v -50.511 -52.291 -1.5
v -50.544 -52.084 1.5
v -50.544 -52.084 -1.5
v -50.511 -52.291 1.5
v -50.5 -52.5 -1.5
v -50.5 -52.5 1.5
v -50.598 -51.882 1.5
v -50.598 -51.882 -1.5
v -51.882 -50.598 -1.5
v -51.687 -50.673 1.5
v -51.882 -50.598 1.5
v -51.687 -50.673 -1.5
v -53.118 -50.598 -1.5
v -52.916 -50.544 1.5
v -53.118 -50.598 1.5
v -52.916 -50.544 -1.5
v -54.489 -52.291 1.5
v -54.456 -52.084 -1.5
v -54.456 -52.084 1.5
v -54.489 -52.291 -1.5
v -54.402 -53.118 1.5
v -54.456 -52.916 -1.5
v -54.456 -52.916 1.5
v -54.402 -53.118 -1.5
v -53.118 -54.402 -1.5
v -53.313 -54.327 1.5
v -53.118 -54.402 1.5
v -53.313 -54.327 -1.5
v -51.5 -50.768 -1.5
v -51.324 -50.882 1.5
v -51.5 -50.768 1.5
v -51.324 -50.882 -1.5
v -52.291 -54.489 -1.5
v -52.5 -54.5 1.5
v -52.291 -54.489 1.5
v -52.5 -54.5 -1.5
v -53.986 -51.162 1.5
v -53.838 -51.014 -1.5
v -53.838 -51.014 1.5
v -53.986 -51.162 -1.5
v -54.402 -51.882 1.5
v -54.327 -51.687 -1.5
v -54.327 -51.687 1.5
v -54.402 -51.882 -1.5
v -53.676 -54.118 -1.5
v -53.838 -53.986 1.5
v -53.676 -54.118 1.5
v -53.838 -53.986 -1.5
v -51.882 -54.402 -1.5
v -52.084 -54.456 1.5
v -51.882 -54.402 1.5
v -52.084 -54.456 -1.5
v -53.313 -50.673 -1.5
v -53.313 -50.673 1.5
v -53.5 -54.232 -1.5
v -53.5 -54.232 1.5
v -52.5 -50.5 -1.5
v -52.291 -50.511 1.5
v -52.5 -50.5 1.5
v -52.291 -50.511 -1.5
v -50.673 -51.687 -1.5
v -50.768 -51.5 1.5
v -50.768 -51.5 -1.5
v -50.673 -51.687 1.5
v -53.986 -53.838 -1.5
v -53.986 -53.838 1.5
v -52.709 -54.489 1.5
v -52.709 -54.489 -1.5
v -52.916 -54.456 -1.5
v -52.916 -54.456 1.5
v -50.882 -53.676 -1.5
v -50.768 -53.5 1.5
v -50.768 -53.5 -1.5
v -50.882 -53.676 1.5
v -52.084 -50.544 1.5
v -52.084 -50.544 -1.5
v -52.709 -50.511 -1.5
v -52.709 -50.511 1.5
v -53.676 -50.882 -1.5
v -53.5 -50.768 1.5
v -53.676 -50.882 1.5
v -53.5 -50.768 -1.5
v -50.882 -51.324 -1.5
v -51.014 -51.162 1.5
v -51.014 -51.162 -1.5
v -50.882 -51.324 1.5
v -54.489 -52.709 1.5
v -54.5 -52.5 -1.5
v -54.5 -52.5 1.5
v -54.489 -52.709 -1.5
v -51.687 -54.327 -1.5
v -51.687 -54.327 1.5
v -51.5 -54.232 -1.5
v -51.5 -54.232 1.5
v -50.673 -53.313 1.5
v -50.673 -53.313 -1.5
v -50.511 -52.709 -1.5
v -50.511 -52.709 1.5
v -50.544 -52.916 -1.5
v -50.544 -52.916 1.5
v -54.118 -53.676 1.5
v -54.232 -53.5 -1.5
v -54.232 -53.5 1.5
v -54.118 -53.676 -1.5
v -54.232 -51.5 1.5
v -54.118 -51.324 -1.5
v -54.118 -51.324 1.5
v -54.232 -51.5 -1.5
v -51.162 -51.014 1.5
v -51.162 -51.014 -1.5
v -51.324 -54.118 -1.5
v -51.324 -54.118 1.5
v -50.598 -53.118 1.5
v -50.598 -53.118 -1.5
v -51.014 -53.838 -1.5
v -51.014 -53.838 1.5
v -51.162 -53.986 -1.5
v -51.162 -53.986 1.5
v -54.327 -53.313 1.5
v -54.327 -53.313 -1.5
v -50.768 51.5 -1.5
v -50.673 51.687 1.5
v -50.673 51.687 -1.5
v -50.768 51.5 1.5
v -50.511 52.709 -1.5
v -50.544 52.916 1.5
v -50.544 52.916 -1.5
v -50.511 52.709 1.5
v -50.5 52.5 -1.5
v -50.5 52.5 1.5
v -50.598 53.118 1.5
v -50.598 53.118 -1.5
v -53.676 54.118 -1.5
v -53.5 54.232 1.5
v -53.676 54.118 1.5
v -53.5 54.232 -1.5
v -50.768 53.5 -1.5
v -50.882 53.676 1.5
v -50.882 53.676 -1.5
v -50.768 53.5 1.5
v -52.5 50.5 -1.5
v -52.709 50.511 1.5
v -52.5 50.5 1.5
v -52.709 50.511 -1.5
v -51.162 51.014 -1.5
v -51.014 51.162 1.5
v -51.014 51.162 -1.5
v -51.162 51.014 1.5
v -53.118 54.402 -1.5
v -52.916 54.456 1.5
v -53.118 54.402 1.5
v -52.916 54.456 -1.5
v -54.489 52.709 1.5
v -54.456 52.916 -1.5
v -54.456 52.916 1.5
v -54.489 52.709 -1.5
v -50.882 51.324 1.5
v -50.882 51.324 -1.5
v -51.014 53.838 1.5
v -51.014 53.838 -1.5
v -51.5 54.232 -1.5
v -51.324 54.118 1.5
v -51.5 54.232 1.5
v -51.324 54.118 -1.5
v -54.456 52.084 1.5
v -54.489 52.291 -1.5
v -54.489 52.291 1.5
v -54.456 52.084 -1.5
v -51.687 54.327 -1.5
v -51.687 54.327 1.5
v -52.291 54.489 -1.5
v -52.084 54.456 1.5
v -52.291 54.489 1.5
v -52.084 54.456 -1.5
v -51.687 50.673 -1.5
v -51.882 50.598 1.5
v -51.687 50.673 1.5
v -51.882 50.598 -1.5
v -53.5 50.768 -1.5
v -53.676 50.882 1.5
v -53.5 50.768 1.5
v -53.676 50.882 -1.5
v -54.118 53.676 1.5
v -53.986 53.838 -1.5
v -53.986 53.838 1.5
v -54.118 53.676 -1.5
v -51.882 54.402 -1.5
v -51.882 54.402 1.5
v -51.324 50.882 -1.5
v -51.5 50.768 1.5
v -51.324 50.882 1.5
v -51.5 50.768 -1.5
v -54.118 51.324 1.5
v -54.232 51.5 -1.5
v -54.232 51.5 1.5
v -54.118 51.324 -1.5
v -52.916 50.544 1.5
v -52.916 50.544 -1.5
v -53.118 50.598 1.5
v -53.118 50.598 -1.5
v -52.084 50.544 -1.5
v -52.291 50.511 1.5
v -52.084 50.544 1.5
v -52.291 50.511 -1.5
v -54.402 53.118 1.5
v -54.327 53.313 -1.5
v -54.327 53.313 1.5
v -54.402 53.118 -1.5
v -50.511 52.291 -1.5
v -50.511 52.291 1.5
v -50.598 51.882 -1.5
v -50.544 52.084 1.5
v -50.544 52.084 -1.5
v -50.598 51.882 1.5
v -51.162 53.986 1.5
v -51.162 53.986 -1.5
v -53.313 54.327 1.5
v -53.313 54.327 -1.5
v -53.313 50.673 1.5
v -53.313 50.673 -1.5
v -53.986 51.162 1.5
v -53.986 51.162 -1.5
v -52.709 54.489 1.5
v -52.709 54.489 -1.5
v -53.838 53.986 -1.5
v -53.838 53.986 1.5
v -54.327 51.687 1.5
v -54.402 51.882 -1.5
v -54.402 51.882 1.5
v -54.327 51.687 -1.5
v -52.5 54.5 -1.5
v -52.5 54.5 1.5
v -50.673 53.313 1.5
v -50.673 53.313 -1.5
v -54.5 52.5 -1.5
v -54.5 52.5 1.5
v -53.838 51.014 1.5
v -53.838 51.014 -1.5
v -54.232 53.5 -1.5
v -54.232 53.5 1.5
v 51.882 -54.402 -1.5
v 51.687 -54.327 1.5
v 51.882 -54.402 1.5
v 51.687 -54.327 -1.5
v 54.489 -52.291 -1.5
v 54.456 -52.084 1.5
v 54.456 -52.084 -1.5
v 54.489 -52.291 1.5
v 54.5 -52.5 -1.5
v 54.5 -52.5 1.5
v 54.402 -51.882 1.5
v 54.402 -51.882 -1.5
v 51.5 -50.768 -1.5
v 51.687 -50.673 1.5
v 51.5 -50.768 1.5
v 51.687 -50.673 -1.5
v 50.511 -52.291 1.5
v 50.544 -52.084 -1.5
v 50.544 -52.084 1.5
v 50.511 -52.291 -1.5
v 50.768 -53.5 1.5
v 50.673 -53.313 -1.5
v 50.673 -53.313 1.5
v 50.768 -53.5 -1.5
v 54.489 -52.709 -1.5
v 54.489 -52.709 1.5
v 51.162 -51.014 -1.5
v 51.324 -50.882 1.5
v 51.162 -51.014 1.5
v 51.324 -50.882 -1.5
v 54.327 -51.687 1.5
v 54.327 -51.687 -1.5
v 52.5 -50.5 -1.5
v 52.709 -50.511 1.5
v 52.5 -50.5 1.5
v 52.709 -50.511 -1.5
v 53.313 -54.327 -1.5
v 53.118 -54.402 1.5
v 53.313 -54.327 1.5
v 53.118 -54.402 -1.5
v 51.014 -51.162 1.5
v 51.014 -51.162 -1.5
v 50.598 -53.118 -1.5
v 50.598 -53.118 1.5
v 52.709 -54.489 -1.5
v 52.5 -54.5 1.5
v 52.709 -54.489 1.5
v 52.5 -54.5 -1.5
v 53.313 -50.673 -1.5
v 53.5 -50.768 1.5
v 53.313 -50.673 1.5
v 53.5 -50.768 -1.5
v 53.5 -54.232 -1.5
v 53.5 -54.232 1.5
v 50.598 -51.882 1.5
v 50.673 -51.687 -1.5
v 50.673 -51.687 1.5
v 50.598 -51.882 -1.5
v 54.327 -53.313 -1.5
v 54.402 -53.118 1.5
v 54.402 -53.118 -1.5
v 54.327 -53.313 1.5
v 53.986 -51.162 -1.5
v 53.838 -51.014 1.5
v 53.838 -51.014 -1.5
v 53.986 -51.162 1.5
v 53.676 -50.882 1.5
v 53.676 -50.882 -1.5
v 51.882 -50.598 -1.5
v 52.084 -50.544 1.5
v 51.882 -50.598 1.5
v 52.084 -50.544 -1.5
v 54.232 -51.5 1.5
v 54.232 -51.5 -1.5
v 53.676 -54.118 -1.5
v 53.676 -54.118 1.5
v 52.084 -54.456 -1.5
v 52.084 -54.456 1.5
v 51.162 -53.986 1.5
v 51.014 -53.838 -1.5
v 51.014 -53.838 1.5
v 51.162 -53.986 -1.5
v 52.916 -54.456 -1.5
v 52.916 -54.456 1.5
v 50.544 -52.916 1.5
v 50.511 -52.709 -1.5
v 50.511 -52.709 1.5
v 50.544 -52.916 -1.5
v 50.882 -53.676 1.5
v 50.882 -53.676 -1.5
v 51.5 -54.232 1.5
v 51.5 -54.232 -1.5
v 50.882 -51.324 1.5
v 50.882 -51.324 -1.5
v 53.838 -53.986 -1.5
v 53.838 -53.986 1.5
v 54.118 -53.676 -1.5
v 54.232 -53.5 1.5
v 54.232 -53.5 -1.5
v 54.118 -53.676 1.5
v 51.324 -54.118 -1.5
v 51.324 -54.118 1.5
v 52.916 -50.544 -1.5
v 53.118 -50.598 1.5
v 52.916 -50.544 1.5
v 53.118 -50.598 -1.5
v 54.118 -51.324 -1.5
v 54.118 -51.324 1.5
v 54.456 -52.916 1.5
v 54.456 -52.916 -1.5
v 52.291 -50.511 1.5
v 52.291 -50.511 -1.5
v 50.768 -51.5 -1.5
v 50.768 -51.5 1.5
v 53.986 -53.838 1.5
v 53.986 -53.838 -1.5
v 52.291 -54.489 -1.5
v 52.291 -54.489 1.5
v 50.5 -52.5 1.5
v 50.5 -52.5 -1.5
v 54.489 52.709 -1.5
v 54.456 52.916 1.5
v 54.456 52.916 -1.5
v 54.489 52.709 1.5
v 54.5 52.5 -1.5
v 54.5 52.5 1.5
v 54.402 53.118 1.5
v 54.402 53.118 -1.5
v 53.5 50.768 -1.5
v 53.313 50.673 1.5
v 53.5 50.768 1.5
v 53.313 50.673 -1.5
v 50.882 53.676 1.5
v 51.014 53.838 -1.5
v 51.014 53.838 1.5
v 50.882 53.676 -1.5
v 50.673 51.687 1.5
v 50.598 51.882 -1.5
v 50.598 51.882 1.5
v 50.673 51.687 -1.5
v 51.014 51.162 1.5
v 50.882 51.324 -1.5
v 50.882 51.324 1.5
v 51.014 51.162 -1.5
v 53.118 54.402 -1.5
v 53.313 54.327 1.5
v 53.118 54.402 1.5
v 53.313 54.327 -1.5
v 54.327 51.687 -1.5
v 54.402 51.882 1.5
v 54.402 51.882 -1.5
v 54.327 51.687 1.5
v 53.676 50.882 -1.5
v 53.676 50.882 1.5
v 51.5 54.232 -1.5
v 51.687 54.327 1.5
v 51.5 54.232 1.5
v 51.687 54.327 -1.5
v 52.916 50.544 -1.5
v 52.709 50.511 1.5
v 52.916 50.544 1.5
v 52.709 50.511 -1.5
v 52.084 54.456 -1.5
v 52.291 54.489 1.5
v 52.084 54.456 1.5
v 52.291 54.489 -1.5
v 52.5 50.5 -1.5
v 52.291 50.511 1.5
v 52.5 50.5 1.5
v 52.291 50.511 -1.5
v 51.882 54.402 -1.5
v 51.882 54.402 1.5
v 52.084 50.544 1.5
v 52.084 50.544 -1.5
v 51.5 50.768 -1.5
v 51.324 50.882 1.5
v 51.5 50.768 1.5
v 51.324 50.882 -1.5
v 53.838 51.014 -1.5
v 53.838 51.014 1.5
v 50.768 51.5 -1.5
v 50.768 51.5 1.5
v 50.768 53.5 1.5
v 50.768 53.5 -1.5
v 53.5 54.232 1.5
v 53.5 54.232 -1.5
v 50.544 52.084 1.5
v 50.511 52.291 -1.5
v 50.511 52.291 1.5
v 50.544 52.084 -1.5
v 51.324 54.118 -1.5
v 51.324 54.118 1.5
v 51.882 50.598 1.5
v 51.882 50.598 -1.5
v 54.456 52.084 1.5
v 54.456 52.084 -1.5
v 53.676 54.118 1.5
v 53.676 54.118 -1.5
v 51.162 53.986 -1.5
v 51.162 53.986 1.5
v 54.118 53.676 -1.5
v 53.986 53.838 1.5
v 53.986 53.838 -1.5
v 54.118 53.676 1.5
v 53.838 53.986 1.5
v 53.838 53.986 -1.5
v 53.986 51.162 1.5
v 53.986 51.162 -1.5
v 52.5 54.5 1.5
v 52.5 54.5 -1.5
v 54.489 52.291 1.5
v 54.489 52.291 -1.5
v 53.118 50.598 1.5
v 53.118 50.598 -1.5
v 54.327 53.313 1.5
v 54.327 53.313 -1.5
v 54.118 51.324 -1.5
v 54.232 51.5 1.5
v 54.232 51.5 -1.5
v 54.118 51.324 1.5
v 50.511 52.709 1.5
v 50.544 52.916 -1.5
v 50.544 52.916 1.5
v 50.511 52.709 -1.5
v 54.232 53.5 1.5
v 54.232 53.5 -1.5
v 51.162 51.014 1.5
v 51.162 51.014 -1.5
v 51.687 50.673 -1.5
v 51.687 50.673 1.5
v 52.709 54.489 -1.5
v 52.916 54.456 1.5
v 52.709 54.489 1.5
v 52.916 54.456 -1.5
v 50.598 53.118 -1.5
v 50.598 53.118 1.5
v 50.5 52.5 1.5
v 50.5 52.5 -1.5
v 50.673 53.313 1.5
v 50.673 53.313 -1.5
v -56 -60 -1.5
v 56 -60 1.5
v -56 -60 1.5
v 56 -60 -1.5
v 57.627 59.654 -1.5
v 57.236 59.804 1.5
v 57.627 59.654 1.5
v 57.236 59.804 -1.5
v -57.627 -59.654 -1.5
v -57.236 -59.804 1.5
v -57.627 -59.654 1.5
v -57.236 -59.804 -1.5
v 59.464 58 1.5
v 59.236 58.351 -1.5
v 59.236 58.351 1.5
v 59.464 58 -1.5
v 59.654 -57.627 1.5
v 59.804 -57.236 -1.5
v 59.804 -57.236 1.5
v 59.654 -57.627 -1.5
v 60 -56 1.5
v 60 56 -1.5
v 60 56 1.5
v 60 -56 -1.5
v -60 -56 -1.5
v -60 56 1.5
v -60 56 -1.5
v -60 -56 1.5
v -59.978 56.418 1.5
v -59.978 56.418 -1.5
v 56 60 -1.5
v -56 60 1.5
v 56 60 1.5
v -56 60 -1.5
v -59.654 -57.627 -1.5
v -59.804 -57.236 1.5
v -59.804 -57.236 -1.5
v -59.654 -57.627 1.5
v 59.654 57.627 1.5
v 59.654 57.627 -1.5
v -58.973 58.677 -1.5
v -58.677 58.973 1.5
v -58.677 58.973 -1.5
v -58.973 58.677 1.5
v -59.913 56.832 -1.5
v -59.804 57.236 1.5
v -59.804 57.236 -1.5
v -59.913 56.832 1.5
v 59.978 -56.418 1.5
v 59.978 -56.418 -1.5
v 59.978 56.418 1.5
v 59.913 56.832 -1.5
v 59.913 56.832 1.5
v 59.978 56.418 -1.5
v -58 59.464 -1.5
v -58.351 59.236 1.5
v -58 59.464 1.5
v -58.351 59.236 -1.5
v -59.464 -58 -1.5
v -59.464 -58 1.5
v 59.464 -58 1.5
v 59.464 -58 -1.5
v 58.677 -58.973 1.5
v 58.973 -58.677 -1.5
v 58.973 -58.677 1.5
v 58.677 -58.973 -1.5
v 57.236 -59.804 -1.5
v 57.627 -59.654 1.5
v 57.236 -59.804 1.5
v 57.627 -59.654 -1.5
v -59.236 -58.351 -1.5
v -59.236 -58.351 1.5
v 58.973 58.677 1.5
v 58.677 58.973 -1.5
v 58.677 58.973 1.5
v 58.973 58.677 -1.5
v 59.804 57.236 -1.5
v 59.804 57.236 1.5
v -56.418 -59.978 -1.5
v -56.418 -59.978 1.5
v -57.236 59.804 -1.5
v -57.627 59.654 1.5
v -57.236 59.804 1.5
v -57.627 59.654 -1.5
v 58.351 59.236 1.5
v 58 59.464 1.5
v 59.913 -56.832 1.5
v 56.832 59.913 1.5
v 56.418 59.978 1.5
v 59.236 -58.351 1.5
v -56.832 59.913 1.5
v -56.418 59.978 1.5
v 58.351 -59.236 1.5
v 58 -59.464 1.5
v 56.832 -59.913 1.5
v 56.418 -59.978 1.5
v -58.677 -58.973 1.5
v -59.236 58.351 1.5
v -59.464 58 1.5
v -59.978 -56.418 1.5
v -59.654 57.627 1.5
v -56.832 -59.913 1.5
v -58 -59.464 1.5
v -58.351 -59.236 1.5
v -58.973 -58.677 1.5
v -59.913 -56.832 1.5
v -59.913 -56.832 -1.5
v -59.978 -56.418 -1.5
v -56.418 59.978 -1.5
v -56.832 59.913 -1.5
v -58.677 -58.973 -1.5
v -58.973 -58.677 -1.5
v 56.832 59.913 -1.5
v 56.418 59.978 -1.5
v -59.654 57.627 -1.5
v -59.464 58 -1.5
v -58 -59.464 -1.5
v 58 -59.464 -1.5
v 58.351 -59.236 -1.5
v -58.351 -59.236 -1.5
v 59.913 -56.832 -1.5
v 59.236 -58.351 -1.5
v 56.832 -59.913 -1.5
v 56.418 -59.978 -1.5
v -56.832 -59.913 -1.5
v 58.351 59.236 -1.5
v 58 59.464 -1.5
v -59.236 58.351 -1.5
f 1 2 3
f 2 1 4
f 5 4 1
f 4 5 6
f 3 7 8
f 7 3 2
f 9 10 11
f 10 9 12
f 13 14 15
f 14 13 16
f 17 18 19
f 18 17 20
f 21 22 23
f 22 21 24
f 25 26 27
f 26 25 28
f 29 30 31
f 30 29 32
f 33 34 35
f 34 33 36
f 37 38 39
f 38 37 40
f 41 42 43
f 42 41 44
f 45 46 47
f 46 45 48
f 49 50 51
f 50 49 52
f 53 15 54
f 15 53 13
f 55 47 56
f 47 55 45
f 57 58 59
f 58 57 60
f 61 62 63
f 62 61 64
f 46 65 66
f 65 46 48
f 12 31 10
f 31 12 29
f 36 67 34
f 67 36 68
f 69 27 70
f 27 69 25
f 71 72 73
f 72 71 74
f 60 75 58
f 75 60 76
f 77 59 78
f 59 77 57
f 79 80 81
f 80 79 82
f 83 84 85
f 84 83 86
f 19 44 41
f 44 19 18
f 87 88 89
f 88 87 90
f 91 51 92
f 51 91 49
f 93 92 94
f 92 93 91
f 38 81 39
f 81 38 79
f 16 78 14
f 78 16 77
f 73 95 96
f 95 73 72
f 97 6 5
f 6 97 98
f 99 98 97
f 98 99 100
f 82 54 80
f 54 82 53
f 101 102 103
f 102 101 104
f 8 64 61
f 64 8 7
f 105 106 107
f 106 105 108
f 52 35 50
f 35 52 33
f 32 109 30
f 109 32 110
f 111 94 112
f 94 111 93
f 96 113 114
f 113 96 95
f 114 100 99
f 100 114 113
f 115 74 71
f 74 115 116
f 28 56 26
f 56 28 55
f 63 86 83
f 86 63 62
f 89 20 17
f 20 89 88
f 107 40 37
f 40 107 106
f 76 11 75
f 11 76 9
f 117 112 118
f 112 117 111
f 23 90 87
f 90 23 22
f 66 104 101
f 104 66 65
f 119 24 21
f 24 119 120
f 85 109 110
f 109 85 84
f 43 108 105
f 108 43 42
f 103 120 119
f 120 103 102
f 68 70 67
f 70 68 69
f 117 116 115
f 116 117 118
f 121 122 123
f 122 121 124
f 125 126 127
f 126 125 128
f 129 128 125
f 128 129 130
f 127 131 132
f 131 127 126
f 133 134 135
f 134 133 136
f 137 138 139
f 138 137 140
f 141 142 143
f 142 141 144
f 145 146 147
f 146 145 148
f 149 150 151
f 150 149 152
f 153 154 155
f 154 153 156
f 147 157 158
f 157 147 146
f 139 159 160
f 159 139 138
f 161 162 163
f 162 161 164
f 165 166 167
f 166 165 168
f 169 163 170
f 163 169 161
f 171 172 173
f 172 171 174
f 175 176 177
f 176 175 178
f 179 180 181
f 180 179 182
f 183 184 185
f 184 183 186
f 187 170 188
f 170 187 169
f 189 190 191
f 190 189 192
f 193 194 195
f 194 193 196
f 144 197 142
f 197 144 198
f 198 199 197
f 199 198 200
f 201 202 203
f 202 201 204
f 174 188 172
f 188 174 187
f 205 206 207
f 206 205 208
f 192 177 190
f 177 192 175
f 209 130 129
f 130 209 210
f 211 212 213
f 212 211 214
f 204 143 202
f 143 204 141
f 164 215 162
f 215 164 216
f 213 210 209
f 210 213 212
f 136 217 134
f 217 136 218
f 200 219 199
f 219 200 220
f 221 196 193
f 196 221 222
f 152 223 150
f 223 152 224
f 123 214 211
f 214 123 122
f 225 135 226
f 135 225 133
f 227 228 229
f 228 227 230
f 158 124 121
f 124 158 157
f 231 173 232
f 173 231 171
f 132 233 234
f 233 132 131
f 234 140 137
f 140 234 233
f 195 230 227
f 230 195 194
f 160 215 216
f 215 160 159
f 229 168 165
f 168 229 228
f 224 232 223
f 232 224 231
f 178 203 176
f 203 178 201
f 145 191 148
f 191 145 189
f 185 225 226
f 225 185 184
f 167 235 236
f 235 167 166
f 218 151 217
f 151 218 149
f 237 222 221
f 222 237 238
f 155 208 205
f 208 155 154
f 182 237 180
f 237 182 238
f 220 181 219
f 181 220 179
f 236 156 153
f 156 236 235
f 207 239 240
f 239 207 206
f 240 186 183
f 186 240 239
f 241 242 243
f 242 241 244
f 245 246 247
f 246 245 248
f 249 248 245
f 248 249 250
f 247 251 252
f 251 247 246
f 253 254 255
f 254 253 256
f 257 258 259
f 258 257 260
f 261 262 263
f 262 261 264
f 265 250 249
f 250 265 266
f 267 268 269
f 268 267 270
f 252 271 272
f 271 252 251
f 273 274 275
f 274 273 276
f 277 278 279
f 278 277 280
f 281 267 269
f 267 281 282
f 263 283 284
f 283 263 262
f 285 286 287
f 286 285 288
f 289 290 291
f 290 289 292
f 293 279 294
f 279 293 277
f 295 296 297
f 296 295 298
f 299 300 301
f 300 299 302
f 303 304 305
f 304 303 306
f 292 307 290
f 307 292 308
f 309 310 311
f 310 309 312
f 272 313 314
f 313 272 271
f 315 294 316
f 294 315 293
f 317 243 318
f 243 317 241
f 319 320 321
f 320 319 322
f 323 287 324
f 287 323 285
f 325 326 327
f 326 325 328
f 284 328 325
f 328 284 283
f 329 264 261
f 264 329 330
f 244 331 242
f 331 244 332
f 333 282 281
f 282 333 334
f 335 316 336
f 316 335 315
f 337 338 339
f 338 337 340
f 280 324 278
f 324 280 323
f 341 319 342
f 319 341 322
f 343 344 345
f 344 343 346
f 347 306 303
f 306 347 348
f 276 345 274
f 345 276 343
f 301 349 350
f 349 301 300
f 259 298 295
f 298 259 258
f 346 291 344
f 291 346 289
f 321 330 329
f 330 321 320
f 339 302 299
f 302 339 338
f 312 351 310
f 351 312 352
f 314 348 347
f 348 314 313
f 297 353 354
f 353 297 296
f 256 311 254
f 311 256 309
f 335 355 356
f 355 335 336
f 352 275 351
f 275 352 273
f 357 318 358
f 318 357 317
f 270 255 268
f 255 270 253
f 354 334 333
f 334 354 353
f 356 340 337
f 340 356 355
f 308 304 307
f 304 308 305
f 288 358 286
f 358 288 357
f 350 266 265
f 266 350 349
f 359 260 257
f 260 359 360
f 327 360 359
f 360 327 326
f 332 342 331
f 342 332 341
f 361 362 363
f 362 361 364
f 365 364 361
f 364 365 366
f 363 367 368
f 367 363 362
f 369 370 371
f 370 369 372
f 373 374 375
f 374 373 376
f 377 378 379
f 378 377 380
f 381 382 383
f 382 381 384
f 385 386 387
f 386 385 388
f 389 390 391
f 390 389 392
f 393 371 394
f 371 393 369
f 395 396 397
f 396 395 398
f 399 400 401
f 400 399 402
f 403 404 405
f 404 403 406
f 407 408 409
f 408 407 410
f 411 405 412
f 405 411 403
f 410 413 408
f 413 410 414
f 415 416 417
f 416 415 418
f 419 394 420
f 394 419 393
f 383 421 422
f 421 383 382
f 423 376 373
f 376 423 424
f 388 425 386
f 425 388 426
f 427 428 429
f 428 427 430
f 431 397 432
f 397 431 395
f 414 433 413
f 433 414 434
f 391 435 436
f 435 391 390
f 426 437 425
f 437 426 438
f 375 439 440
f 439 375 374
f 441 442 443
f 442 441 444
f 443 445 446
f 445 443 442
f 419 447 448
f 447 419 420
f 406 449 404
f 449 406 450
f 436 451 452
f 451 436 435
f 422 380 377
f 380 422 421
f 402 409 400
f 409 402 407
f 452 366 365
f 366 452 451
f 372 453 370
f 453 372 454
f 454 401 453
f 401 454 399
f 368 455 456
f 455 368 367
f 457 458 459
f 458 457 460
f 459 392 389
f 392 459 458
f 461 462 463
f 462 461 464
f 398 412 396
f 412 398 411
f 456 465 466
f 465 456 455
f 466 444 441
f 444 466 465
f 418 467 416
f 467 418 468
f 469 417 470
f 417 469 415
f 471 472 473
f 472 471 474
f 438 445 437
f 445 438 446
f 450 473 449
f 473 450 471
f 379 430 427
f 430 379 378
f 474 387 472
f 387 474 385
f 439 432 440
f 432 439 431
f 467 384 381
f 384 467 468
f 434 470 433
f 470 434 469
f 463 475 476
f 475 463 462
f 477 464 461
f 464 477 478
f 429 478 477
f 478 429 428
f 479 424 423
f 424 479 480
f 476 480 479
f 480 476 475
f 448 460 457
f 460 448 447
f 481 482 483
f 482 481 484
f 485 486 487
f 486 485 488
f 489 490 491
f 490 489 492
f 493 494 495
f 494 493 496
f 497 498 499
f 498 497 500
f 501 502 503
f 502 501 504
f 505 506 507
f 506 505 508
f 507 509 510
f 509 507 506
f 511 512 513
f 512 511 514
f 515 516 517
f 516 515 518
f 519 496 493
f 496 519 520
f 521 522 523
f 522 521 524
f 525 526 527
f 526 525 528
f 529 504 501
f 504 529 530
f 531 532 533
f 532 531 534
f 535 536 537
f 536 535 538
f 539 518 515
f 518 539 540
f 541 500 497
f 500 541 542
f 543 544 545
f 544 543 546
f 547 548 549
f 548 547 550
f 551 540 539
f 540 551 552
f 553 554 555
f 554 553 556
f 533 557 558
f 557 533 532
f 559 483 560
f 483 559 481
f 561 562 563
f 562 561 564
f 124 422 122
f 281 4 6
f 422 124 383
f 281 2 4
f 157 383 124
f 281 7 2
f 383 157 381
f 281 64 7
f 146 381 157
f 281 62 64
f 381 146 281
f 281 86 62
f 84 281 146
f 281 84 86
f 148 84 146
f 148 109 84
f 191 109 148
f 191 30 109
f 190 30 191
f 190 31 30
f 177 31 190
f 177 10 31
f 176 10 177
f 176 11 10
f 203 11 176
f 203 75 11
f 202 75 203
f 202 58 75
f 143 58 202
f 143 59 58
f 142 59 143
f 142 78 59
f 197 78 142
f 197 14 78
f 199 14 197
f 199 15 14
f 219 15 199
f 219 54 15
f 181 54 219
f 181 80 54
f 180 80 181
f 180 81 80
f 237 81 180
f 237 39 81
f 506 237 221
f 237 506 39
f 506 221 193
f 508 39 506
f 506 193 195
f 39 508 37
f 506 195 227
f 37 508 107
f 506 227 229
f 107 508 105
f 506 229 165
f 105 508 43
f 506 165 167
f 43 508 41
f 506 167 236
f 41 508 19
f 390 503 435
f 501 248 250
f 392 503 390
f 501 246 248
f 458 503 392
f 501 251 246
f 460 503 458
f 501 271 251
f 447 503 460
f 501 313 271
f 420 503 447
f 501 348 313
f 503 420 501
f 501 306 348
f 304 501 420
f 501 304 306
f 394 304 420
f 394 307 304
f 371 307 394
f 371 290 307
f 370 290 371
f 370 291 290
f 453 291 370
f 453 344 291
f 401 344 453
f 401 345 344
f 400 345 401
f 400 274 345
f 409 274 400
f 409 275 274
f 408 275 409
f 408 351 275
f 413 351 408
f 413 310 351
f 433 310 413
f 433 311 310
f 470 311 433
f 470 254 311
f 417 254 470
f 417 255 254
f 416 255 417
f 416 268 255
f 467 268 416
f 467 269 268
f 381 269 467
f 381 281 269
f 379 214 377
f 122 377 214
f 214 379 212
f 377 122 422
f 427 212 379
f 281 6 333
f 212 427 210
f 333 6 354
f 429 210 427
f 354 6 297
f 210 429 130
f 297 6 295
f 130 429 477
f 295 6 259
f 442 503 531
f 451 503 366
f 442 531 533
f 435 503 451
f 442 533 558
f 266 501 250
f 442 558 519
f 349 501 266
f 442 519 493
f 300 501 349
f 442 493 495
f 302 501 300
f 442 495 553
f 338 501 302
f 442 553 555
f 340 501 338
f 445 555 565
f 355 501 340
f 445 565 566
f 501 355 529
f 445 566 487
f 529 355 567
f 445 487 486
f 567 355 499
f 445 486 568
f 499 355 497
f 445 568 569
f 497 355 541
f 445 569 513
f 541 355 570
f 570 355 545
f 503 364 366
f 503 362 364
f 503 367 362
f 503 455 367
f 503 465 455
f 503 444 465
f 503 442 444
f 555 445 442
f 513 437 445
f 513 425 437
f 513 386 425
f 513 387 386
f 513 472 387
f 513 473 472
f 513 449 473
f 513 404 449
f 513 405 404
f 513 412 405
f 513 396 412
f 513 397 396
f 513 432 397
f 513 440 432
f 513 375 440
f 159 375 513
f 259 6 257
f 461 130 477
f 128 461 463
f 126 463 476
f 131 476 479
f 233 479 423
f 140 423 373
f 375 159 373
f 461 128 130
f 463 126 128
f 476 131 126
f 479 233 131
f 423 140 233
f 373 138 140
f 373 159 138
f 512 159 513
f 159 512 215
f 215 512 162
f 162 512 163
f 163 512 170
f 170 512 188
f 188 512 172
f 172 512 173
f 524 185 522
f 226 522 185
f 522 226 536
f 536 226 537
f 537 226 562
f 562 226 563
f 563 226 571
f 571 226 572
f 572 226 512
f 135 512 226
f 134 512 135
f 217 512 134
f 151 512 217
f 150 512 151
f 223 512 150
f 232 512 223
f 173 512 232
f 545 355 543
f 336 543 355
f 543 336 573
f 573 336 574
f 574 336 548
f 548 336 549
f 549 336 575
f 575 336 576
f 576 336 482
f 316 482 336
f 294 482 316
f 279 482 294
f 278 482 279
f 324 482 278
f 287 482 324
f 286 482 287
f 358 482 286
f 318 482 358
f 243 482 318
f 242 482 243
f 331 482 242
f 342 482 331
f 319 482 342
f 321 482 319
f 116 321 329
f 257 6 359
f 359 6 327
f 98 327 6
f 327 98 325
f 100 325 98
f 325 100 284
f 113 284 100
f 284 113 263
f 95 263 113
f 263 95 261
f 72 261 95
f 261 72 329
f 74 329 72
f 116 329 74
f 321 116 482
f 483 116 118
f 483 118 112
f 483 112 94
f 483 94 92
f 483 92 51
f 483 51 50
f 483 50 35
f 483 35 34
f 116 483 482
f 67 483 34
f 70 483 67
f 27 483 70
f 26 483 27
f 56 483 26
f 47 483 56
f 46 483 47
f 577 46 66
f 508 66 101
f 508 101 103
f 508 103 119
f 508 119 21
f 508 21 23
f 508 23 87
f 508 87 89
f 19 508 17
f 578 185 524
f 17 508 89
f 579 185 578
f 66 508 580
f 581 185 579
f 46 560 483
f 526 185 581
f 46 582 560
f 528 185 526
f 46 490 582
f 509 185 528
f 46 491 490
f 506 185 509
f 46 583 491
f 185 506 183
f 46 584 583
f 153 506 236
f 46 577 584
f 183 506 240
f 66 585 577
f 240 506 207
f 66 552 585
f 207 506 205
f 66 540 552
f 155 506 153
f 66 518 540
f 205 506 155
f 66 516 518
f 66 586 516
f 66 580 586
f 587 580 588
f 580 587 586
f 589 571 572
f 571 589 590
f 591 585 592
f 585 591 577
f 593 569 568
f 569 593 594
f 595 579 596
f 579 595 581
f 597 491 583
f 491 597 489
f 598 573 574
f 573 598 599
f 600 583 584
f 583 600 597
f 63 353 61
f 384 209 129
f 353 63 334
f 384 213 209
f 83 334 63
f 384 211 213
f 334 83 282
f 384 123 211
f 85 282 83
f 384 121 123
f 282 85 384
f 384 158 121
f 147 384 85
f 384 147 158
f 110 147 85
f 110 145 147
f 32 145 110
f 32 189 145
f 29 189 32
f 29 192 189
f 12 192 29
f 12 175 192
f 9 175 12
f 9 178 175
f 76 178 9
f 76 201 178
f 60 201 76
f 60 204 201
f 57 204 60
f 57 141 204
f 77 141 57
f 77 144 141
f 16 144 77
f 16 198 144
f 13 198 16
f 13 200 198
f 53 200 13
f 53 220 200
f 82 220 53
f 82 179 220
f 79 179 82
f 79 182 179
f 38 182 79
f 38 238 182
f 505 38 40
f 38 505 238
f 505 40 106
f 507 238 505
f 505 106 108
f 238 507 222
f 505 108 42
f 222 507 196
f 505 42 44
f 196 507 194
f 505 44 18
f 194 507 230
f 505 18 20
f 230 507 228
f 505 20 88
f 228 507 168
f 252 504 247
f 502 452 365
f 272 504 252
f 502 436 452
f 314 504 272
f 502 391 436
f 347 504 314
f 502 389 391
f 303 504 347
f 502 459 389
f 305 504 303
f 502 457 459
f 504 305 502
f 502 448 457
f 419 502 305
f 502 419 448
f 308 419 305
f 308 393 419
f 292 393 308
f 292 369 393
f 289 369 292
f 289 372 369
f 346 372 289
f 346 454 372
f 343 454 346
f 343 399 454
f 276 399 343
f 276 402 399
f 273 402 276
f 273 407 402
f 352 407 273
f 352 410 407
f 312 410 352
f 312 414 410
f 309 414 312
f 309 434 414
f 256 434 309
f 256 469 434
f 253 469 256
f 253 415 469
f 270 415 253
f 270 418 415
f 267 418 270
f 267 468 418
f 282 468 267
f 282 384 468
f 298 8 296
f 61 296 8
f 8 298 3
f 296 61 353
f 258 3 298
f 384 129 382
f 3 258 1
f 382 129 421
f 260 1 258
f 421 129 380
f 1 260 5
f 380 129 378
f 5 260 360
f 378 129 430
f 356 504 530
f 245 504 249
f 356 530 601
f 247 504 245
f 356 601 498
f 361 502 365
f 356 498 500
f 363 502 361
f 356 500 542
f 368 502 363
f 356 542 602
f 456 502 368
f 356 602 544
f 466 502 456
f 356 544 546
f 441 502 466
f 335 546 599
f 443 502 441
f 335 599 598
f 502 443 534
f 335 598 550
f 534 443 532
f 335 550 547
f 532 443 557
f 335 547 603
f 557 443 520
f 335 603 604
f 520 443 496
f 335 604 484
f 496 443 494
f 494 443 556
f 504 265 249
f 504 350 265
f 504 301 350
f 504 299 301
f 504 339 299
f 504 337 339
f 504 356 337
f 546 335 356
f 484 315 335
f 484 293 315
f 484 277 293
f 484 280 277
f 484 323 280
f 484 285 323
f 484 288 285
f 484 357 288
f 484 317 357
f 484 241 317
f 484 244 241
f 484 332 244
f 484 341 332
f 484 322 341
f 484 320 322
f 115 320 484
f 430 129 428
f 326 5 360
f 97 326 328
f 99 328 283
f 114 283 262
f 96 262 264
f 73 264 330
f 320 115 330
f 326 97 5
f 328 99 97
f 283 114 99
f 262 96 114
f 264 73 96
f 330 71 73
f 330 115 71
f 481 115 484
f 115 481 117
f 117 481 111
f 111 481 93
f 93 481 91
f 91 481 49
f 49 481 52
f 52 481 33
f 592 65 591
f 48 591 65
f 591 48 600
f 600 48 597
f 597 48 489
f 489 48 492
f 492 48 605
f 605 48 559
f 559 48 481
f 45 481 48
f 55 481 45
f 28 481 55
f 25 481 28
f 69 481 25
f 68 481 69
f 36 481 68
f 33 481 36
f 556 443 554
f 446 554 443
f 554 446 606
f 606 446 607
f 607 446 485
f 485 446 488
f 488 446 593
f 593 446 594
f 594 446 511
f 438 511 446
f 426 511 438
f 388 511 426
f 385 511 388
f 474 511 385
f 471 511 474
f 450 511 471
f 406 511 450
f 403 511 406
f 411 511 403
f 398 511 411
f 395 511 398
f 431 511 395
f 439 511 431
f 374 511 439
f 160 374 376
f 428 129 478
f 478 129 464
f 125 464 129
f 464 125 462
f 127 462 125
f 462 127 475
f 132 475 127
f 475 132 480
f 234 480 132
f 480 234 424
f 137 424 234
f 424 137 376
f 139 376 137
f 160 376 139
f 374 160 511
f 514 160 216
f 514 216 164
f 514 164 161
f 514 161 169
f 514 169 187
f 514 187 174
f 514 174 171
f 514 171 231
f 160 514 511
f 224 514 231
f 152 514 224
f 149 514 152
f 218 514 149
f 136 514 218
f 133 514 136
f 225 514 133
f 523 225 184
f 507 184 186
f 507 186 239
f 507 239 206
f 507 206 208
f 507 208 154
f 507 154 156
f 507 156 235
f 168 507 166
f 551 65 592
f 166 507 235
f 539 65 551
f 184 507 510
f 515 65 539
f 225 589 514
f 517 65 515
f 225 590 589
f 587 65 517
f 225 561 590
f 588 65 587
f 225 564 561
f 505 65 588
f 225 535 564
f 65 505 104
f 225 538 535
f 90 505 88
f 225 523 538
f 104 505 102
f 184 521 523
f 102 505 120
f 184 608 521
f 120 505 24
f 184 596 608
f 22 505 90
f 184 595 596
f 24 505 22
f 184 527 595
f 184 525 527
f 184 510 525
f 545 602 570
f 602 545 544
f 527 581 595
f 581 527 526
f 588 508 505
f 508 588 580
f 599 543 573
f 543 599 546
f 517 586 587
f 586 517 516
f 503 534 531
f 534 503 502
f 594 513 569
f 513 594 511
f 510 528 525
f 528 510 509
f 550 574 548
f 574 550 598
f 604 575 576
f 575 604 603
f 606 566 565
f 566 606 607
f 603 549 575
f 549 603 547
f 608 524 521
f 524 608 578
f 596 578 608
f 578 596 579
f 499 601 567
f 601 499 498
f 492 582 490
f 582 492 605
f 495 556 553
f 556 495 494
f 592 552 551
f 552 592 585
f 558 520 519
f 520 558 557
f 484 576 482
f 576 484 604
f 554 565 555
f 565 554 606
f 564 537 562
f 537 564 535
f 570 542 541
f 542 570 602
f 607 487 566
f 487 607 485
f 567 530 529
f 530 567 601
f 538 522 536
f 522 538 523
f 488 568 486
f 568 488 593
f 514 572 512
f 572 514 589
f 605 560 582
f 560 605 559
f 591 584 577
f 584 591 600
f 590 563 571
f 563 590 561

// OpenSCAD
$fn=60;
filter=[72.5,110,20];
fan_dia=116;
sthickness=20;

//filter_120();
fan_grill(blank=true);
//cover();

module assemble(){
    translate([0, 0, -2]) fan_120(thickness=4);
    translate([0, 0, 10]) filter_120();
    for(X=[-1,1]) translate([((filter[0]+1)/2)*X, 0, 30]) filter();
    translate([0,0,sthickness/2+filter[2]+1]) cover();
}
module cover(){
  difference(){
    union(){
      cube([filter[0]*2+5, filter[1]+4, filter[2]+2], center=true);
      translate([0,0,-filter[2]+4])
      cube([filter[0]*2+5, filter[1], filter[2]+2], center=true);
      for(Y=[-0.5,1])
      hull(){
        translate([0,(filter[1]-8)/2*Y,filter[2]/2])
        cube([filter[0]*2+5,8,1], center=true);
      for(X=[-1,1])
        translate([(filter[0]+8)*X,(filter[1]-8)/2*Y,-filter[2]*1.5+3])
          cylinder(d=8, h=4);
      }
    }
    for(X=[-1,1]){
      translate([((filter[0]+1)/2)*X, 0, filter[2]-filter[2]/2]) 
        cube([filter[0]-12,filter[1]-12,4], center=true);
    }
    translate([0,0,-1])
    cube([filter[0]*2+2, filter[1]+2, filter[2]+2], center=true);
    translate([0,0,-filter[2]-2])
      cube([filter[0]*2+3, filter[1]+5, filter[2]+2], center=true);
    for(Y=[-0.5,1], X=[-1,1])
        translate([(filter[0]+8)*X,(filter[1]-8)/2*Y,-filter[2]*1.5+2]) 
          cylinder(d=3.2, h=10);
  }
}

module filter_120(){
  difference(){
    union(){
      cube([filter[0]*2+1, filter[1]+10, sthickness], center=true);
      hull()
      for(X=[-1,1])
        translate([(filter[0]+sthickness/2)*X,-filter[1]/2-2,0]) 
          rotate([90,0,0]) cylinder(d=sthickness, h=4);
      for(Y=[-0.5,1])
      hull()
      for(X=[-1,1])
        translate([(filter[0]+8)*X,(filter[1]-8)/2*Y,-sthickness/2]) 
          cylinder(d=8, h=4);
    }
    for(X=[-1,1]){
      translate([0,0,-sthickness/2]) hull(){
          translate([((filter[0]+1)/2)*X, 0, sthickness]) 
            cube([filter[0]-12,filter[1]-12,0.1], center=true);
          intersection(){
            cylinder(d=fan_dia, h=0.1, center=true);
            translate([fan_dia/4*X,0,0])
              cube([fan_dia/2, fan_dia, 0.1], center=true);
          }
        }
      for(Y=[-0.5,1], X=[-1,1])
        translate([(filter[0]+8)*X,(filter[1]-8)/2*Y,-sthickness/2]) 
          cylinder(d=4, h=6);
      translate([(filter[0]+sthickness/2)*X,-filter[1]/2-2,0]) 
          rotate([90,0,0]) cylinder(d=4, h=6);
    }
    for(X=[-1,1], Y=[-1,1]) translate([52.5*X, 52.5*Y, 0]){
      cylinder(d=5, h=sthickness+2, center=true);
      hull()
      for(Y2=[0,-6])
      translate([0, Y2*Y, 3])
        cylinder(d=8, h=sthickness+2, center=true);
    }
  }
}

module fan_base(thickness=5){
    difference(){
        hull()
        for(X=[-1,1], Y=[-1,1])
            translate([56*X, 56*Y, 0]) 
                cylinder(d=8, h=thickness, center=true);
        for(X=[-1,1], Y=[-1,1])
            translate([52.5*X, 52.5*Y, 0]) 
                cylinder(d=4, h=thickness+2, center=true);
    }
}

module fan_120(thickness=25){
    difference(){
        fan_base(thickness);
        cylinder(d=116, h=thickness+2, center=true);
    }
}

module fan_grill(thickness=3, blank=false){
    difference(){
        fan_base(thickness);
        if( ! blank )
        intersection(){
            cylinder(d=117, h=thickness+2, center=true);
            for(X=[-6:1:6], Y=[-6:1:6]){
                translate([10*X+5*(Y%2),9*Y,0]) rotate([0,0,30])
                cylinder(d=10,h=thickness+1, $fn=6, center=true);
            }
        }
        
    }
}

module filter(){
    color("white")
    difference(){
        cube([filter[0],filter[1],filter[2]], center=true);
        translate([0,0,-1+filter[2]/2]) 
            cube([filter[0]-12,filter[1]-12,3], center=true);
        translate([0,0,-filter[2]/2]) 
            cube([filter[0]-12,filter[1]-12,1], center=true);
    }
}
